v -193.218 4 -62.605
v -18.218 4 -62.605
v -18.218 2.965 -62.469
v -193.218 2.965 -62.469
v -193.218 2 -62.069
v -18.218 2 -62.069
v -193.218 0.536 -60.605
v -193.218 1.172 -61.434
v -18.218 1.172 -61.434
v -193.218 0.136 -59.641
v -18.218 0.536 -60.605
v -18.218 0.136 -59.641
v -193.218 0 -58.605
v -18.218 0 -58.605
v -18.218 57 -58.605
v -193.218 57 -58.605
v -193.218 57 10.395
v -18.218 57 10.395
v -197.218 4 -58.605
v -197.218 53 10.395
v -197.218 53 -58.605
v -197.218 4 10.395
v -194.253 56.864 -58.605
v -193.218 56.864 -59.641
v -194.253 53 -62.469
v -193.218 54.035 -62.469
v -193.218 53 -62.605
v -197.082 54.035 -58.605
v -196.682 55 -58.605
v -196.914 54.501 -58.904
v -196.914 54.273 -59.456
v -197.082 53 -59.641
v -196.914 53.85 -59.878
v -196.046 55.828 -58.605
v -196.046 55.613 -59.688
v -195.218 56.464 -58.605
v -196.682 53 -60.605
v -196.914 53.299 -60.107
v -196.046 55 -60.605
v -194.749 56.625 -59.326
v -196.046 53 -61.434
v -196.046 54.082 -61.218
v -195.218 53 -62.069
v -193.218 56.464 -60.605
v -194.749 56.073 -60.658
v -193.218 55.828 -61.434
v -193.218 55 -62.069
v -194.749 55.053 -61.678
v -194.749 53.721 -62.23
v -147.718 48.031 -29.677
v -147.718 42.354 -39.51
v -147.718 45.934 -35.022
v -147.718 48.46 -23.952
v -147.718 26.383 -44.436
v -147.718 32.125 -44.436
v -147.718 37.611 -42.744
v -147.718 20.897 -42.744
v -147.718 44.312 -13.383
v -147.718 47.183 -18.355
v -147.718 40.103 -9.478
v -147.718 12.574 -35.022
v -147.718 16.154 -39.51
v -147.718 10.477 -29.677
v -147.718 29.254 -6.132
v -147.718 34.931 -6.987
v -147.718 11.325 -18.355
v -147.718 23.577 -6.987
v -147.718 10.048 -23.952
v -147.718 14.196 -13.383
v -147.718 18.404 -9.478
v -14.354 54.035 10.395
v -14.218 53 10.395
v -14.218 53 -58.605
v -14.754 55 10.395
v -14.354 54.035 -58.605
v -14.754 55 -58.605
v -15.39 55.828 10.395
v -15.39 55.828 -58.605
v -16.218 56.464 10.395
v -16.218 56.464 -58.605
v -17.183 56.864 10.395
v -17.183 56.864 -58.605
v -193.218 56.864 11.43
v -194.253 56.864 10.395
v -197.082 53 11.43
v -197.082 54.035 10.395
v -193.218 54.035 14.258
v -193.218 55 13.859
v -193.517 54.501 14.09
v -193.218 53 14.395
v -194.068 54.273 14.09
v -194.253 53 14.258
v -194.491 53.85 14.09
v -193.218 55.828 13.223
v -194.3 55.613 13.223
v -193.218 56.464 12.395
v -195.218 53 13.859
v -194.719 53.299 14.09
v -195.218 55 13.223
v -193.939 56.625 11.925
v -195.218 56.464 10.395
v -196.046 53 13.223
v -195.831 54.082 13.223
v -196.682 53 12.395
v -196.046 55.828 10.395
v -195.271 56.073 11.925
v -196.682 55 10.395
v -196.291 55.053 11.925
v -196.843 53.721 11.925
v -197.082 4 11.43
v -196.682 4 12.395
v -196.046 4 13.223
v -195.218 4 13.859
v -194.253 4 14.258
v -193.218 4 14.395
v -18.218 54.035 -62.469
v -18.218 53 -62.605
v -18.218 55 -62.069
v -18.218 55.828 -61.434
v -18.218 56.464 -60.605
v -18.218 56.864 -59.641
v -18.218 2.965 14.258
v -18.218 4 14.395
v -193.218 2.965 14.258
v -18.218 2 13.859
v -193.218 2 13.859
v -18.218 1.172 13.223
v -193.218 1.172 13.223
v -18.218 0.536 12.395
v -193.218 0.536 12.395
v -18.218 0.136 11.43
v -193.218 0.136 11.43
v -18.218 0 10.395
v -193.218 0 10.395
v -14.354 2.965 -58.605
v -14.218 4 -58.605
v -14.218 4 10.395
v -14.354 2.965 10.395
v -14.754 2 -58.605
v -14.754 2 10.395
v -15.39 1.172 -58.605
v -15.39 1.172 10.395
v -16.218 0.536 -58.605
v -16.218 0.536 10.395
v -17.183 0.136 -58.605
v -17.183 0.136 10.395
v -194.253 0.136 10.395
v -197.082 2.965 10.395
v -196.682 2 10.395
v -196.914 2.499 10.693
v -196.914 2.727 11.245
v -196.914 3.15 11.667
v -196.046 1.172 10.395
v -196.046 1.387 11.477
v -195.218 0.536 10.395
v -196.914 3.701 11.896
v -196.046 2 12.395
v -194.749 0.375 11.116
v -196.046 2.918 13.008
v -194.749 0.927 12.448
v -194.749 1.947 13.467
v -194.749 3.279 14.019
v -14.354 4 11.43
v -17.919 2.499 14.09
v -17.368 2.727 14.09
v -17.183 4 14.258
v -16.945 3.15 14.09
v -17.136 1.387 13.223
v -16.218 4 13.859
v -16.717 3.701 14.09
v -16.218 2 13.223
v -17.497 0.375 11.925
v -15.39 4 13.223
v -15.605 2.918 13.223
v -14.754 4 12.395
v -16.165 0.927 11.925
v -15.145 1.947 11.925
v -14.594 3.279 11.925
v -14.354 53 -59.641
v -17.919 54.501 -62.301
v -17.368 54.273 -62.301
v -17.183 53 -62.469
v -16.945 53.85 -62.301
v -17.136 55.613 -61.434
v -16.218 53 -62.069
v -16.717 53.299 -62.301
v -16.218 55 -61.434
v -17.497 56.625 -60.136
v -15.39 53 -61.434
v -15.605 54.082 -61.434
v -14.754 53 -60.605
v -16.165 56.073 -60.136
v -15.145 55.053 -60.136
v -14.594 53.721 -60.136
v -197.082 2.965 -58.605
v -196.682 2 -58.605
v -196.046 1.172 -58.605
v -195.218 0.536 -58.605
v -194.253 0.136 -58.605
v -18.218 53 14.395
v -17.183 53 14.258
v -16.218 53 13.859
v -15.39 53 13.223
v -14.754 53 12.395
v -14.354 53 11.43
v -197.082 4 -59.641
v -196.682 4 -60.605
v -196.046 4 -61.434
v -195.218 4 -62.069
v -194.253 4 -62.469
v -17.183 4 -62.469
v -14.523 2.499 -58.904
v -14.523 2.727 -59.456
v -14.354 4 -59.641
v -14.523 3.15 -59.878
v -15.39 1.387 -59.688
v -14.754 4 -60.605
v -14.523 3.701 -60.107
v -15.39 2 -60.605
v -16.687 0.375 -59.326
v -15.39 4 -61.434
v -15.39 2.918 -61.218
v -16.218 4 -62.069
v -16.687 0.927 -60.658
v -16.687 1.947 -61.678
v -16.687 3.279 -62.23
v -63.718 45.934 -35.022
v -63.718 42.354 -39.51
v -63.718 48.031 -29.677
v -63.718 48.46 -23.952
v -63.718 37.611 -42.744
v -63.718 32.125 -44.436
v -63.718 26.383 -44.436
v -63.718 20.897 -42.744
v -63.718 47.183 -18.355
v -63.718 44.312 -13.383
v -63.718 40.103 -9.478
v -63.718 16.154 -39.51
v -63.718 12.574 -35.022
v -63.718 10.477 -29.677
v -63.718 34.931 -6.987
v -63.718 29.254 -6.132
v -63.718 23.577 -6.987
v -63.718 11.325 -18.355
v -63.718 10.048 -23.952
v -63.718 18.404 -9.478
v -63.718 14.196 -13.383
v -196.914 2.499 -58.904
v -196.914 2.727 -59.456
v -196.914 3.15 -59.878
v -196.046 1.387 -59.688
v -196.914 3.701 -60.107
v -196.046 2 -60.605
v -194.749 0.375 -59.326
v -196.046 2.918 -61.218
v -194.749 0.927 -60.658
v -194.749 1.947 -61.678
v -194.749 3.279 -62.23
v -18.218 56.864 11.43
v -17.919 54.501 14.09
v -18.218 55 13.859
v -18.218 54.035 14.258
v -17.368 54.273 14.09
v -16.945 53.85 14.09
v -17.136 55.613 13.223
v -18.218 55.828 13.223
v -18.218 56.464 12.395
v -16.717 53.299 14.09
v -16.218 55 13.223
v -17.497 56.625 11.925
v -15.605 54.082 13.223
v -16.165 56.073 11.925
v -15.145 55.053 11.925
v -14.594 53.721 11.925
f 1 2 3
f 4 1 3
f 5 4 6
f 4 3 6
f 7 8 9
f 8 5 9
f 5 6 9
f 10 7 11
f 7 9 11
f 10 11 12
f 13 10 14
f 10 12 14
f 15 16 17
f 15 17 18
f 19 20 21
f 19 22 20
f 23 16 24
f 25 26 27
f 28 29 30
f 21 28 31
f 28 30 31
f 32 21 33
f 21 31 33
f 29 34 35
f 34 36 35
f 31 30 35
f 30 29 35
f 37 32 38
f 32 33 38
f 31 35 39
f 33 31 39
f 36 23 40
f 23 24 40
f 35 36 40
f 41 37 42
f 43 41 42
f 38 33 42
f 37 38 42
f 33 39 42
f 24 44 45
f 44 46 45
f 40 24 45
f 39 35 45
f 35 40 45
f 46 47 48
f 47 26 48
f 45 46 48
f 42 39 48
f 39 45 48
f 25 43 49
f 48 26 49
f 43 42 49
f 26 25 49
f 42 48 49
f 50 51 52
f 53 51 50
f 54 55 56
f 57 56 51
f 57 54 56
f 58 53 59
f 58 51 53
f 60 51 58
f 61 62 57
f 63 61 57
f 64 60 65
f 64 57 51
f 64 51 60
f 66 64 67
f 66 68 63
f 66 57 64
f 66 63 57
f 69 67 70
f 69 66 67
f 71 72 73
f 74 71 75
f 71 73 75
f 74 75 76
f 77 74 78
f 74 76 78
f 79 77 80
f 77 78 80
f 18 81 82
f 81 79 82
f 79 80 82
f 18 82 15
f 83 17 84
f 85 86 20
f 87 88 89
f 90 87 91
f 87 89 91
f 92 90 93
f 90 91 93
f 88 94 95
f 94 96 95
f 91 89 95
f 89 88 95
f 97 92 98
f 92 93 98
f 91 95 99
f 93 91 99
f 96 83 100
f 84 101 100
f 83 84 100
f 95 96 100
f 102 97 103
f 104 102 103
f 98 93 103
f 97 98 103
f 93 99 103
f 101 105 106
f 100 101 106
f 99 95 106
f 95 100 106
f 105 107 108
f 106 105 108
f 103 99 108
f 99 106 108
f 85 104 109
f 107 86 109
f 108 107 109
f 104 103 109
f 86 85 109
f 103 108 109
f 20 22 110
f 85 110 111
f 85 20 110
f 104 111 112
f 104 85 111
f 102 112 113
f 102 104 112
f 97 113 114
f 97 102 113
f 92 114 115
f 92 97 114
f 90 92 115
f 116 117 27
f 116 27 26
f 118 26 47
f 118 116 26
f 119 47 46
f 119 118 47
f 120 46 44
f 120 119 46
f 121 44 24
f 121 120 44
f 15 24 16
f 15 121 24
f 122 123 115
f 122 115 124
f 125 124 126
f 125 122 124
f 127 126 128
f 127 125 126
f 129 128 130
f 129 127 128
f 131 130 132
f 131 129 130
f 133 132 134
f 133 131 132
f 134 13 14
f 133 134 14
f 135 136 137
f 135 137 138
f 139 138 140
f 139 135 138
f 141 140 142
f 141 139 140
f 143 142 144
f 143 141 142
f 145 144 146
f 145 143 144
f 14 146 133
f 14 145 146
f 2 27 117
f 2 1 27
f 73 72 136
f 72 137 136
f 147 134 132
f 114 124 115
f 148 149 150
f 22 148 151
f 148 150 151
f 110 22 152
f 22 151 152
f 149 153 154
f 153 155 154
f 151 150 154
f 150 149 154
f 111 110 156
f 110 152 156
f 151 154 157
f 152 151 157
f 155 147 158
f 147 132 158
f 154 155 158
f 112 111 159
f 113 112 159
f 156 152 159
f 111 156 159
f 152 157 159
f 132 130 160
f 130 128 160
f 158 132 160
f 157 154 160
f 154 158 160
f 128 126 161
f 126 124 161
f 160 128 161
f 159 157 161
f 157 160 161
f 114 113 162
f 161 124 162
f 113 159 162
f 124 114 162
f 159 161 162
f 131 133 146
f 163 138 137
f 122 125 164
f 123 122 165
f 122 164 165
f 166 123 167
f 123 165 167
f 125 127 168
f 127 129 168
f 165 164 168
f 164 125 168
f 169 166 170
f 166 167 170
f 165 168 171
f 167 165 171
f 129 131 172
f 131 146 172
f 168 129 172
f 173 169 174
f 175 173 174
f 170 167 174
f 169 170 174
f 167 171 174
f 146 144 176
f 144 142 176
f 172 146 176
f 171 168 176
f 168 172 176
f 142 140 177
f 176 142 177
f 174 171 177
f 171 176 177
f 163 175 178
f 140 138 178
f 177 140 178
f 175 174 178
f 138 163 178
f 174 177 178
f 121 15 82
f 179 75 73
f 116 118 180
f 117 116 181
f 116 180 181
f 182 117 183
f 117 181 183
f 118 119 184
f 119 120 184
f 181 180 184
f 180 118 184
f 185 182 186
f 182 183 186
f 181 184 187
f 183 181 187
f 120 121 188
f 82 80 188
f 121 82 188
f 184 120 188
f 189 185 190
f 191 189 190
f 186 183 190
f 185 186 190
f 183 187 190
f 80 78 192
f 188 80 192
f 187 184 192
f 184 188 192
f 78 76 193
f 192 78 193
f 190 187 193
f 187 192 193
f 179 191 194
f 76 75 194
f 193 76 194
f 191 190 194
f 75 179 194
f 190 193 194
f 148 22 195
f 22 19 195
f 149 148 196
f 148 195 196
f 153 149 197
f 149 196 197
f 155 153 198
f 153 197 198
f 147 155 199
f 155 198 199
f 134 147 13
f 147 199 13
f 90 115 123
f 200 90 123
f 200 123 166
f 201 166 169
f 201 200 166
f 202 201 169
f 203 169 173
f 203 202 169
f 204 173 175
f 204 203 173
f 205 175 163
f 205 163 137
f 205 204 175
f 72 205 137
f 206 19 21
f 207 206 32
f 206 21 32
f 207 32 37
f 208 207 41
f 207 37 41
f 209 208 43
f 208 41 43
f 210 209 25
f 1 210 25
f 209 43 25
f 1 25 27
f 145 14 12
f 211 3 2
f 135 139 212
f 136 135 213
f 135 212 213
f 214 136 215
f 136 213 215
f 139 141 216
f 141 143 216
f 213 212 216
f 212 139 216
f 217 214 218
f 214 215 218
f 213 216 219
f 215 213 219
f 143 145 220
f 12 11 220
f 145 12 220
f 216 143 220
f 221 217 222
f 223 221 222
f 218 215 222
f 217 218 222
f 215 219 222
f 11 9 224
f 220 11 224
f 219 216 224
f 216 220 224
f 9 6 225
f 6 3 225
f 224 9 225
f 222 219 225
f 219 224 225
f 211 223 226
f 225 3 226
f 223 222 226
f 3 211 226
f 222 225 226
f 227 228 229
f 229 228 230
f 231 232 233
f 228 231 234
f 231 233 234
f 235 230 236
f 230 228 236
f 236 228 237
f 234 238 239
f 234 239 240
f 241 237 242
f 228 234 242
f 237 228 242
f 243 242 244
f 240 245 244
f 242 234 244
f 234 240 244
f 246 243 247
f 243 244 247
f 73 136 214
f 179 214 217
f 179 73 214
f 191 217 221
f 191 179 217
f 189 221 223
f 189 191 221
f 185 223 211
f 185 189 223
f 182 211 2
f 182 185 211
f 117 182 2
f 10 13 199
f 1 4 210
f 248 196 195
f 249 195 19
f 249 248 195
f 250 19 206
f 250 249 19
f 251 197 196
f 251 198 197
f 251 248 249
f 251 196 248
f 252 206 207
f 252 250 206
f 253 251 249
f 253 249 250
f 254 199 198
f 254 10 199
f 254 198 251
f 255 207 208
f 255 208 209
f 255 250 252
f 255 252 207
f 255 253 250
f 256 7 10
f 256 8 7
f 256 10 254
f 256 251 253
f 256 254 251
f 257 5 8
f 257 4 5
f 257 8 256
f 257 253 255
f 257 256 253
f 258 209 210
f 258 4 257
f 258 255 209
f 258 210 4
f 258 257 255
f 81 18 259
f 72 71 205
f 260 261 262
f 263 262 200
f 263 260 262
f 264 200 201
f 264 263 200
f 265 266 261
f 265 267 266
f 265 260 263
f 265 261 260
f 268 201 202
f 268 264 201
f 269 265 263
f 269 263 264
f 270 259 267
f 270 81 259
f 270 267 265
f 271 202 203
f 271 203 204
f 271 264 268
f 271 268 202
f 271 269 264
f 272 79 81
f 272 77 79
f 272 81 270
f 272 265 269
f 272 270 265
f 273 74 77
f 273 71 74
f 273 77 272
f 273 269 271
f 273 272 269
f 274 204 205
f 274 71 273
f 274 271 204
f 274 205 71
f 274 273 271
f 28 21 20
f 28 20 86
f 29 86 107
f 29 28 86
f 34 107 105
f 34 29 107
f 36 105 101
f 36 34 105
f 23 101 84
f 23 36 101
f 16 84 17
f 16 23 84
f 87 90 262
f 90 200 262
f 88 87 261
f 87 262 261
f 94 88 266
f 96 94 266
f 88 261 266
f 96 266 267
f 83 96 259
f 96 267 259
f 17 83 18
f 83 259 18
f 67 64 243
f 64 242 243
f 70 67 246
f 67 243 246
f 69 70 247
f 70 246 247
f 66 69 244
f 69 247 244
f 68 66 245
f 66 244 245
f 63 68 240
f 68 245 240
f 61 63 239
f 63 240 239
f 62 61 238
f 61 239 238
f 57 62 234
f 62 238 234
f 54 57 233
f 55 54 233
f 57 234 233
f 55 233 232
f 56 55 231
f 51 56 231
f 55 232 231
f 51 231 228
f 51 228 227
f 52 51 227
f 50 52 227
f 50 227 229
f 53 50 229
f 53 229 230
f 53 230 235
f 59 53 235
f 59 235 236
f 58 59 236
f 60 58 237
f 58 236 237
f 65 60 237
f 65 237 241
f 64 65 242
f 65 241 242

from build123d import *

# Parameters (mm, degrees)
SKETCH1_W           = 183
SKETCH1_H           = 77
BOSS_EXTRUDE1_DEPTH = 57
FILLET1_R           = 4
SKETCH2_R           = 19.259927961
CUT_EXTRUDE1_DEPTH  = 42


with BuildPart() as part:
    # Sketch1 → Boss-Extrude1 (new body)
    with BuildSketch(Plane(origin=(0, 0, 0), x_dir=(1, 0, 0), z_dir=(0, 1, 0))):
        with Locations((-105.718045113, 24.105263158)):
            Rectangle(SKETCH1_W, SKETCH1_H)
    extrude(amount=BOSS_EXTRUDE1_DEPTH)

    # Fillet1
    fillet1_edges = [part.edges().sort_by_distance(p)[0] for p in [
        (-14.218045113, 57, -24.105263158),
        (-105.718045113, 57, -62.605263158),
        (-197.218045113, 57, -24.105263158),
        (-105.718045113, 0, -62.605263158),
        (-14.218045113, 0, -24.105263158),
        (-105.718045113, 0, 14.394736842),
        (-197.218045113, 0, -24.105263158),
        (-105.718045113, 57, 14.394736842),
        (-197.218045113, 28.5, -62.605263158),
        (-14.218045113, 28.5, -62.605263158),
        (-14.218045113, 28.5, 14.394736842),
        (-197.218045113, 28.5, 14.394736842),
    ]]
    fillet(fillet1_edges, radius=FILLET1_R)

    # Sketch2 → Cut-Extrude1 (cut, symmetric)
    with BuildSketch(Plane(origin=(-105.718045113, 0, 0), x_dir=(0, 0, -1), z_dir=(1, 0, 0))):
        with Locations(Location((25.391658687, 29.2539915, 0), (0, 0, 180))):
            Circle(SKETCH2_R)
    extrude(amount=CUT_EXTRUDE1_DEPTH, both=True, mode=Mode.SUBTRACT)


solid = part.part
